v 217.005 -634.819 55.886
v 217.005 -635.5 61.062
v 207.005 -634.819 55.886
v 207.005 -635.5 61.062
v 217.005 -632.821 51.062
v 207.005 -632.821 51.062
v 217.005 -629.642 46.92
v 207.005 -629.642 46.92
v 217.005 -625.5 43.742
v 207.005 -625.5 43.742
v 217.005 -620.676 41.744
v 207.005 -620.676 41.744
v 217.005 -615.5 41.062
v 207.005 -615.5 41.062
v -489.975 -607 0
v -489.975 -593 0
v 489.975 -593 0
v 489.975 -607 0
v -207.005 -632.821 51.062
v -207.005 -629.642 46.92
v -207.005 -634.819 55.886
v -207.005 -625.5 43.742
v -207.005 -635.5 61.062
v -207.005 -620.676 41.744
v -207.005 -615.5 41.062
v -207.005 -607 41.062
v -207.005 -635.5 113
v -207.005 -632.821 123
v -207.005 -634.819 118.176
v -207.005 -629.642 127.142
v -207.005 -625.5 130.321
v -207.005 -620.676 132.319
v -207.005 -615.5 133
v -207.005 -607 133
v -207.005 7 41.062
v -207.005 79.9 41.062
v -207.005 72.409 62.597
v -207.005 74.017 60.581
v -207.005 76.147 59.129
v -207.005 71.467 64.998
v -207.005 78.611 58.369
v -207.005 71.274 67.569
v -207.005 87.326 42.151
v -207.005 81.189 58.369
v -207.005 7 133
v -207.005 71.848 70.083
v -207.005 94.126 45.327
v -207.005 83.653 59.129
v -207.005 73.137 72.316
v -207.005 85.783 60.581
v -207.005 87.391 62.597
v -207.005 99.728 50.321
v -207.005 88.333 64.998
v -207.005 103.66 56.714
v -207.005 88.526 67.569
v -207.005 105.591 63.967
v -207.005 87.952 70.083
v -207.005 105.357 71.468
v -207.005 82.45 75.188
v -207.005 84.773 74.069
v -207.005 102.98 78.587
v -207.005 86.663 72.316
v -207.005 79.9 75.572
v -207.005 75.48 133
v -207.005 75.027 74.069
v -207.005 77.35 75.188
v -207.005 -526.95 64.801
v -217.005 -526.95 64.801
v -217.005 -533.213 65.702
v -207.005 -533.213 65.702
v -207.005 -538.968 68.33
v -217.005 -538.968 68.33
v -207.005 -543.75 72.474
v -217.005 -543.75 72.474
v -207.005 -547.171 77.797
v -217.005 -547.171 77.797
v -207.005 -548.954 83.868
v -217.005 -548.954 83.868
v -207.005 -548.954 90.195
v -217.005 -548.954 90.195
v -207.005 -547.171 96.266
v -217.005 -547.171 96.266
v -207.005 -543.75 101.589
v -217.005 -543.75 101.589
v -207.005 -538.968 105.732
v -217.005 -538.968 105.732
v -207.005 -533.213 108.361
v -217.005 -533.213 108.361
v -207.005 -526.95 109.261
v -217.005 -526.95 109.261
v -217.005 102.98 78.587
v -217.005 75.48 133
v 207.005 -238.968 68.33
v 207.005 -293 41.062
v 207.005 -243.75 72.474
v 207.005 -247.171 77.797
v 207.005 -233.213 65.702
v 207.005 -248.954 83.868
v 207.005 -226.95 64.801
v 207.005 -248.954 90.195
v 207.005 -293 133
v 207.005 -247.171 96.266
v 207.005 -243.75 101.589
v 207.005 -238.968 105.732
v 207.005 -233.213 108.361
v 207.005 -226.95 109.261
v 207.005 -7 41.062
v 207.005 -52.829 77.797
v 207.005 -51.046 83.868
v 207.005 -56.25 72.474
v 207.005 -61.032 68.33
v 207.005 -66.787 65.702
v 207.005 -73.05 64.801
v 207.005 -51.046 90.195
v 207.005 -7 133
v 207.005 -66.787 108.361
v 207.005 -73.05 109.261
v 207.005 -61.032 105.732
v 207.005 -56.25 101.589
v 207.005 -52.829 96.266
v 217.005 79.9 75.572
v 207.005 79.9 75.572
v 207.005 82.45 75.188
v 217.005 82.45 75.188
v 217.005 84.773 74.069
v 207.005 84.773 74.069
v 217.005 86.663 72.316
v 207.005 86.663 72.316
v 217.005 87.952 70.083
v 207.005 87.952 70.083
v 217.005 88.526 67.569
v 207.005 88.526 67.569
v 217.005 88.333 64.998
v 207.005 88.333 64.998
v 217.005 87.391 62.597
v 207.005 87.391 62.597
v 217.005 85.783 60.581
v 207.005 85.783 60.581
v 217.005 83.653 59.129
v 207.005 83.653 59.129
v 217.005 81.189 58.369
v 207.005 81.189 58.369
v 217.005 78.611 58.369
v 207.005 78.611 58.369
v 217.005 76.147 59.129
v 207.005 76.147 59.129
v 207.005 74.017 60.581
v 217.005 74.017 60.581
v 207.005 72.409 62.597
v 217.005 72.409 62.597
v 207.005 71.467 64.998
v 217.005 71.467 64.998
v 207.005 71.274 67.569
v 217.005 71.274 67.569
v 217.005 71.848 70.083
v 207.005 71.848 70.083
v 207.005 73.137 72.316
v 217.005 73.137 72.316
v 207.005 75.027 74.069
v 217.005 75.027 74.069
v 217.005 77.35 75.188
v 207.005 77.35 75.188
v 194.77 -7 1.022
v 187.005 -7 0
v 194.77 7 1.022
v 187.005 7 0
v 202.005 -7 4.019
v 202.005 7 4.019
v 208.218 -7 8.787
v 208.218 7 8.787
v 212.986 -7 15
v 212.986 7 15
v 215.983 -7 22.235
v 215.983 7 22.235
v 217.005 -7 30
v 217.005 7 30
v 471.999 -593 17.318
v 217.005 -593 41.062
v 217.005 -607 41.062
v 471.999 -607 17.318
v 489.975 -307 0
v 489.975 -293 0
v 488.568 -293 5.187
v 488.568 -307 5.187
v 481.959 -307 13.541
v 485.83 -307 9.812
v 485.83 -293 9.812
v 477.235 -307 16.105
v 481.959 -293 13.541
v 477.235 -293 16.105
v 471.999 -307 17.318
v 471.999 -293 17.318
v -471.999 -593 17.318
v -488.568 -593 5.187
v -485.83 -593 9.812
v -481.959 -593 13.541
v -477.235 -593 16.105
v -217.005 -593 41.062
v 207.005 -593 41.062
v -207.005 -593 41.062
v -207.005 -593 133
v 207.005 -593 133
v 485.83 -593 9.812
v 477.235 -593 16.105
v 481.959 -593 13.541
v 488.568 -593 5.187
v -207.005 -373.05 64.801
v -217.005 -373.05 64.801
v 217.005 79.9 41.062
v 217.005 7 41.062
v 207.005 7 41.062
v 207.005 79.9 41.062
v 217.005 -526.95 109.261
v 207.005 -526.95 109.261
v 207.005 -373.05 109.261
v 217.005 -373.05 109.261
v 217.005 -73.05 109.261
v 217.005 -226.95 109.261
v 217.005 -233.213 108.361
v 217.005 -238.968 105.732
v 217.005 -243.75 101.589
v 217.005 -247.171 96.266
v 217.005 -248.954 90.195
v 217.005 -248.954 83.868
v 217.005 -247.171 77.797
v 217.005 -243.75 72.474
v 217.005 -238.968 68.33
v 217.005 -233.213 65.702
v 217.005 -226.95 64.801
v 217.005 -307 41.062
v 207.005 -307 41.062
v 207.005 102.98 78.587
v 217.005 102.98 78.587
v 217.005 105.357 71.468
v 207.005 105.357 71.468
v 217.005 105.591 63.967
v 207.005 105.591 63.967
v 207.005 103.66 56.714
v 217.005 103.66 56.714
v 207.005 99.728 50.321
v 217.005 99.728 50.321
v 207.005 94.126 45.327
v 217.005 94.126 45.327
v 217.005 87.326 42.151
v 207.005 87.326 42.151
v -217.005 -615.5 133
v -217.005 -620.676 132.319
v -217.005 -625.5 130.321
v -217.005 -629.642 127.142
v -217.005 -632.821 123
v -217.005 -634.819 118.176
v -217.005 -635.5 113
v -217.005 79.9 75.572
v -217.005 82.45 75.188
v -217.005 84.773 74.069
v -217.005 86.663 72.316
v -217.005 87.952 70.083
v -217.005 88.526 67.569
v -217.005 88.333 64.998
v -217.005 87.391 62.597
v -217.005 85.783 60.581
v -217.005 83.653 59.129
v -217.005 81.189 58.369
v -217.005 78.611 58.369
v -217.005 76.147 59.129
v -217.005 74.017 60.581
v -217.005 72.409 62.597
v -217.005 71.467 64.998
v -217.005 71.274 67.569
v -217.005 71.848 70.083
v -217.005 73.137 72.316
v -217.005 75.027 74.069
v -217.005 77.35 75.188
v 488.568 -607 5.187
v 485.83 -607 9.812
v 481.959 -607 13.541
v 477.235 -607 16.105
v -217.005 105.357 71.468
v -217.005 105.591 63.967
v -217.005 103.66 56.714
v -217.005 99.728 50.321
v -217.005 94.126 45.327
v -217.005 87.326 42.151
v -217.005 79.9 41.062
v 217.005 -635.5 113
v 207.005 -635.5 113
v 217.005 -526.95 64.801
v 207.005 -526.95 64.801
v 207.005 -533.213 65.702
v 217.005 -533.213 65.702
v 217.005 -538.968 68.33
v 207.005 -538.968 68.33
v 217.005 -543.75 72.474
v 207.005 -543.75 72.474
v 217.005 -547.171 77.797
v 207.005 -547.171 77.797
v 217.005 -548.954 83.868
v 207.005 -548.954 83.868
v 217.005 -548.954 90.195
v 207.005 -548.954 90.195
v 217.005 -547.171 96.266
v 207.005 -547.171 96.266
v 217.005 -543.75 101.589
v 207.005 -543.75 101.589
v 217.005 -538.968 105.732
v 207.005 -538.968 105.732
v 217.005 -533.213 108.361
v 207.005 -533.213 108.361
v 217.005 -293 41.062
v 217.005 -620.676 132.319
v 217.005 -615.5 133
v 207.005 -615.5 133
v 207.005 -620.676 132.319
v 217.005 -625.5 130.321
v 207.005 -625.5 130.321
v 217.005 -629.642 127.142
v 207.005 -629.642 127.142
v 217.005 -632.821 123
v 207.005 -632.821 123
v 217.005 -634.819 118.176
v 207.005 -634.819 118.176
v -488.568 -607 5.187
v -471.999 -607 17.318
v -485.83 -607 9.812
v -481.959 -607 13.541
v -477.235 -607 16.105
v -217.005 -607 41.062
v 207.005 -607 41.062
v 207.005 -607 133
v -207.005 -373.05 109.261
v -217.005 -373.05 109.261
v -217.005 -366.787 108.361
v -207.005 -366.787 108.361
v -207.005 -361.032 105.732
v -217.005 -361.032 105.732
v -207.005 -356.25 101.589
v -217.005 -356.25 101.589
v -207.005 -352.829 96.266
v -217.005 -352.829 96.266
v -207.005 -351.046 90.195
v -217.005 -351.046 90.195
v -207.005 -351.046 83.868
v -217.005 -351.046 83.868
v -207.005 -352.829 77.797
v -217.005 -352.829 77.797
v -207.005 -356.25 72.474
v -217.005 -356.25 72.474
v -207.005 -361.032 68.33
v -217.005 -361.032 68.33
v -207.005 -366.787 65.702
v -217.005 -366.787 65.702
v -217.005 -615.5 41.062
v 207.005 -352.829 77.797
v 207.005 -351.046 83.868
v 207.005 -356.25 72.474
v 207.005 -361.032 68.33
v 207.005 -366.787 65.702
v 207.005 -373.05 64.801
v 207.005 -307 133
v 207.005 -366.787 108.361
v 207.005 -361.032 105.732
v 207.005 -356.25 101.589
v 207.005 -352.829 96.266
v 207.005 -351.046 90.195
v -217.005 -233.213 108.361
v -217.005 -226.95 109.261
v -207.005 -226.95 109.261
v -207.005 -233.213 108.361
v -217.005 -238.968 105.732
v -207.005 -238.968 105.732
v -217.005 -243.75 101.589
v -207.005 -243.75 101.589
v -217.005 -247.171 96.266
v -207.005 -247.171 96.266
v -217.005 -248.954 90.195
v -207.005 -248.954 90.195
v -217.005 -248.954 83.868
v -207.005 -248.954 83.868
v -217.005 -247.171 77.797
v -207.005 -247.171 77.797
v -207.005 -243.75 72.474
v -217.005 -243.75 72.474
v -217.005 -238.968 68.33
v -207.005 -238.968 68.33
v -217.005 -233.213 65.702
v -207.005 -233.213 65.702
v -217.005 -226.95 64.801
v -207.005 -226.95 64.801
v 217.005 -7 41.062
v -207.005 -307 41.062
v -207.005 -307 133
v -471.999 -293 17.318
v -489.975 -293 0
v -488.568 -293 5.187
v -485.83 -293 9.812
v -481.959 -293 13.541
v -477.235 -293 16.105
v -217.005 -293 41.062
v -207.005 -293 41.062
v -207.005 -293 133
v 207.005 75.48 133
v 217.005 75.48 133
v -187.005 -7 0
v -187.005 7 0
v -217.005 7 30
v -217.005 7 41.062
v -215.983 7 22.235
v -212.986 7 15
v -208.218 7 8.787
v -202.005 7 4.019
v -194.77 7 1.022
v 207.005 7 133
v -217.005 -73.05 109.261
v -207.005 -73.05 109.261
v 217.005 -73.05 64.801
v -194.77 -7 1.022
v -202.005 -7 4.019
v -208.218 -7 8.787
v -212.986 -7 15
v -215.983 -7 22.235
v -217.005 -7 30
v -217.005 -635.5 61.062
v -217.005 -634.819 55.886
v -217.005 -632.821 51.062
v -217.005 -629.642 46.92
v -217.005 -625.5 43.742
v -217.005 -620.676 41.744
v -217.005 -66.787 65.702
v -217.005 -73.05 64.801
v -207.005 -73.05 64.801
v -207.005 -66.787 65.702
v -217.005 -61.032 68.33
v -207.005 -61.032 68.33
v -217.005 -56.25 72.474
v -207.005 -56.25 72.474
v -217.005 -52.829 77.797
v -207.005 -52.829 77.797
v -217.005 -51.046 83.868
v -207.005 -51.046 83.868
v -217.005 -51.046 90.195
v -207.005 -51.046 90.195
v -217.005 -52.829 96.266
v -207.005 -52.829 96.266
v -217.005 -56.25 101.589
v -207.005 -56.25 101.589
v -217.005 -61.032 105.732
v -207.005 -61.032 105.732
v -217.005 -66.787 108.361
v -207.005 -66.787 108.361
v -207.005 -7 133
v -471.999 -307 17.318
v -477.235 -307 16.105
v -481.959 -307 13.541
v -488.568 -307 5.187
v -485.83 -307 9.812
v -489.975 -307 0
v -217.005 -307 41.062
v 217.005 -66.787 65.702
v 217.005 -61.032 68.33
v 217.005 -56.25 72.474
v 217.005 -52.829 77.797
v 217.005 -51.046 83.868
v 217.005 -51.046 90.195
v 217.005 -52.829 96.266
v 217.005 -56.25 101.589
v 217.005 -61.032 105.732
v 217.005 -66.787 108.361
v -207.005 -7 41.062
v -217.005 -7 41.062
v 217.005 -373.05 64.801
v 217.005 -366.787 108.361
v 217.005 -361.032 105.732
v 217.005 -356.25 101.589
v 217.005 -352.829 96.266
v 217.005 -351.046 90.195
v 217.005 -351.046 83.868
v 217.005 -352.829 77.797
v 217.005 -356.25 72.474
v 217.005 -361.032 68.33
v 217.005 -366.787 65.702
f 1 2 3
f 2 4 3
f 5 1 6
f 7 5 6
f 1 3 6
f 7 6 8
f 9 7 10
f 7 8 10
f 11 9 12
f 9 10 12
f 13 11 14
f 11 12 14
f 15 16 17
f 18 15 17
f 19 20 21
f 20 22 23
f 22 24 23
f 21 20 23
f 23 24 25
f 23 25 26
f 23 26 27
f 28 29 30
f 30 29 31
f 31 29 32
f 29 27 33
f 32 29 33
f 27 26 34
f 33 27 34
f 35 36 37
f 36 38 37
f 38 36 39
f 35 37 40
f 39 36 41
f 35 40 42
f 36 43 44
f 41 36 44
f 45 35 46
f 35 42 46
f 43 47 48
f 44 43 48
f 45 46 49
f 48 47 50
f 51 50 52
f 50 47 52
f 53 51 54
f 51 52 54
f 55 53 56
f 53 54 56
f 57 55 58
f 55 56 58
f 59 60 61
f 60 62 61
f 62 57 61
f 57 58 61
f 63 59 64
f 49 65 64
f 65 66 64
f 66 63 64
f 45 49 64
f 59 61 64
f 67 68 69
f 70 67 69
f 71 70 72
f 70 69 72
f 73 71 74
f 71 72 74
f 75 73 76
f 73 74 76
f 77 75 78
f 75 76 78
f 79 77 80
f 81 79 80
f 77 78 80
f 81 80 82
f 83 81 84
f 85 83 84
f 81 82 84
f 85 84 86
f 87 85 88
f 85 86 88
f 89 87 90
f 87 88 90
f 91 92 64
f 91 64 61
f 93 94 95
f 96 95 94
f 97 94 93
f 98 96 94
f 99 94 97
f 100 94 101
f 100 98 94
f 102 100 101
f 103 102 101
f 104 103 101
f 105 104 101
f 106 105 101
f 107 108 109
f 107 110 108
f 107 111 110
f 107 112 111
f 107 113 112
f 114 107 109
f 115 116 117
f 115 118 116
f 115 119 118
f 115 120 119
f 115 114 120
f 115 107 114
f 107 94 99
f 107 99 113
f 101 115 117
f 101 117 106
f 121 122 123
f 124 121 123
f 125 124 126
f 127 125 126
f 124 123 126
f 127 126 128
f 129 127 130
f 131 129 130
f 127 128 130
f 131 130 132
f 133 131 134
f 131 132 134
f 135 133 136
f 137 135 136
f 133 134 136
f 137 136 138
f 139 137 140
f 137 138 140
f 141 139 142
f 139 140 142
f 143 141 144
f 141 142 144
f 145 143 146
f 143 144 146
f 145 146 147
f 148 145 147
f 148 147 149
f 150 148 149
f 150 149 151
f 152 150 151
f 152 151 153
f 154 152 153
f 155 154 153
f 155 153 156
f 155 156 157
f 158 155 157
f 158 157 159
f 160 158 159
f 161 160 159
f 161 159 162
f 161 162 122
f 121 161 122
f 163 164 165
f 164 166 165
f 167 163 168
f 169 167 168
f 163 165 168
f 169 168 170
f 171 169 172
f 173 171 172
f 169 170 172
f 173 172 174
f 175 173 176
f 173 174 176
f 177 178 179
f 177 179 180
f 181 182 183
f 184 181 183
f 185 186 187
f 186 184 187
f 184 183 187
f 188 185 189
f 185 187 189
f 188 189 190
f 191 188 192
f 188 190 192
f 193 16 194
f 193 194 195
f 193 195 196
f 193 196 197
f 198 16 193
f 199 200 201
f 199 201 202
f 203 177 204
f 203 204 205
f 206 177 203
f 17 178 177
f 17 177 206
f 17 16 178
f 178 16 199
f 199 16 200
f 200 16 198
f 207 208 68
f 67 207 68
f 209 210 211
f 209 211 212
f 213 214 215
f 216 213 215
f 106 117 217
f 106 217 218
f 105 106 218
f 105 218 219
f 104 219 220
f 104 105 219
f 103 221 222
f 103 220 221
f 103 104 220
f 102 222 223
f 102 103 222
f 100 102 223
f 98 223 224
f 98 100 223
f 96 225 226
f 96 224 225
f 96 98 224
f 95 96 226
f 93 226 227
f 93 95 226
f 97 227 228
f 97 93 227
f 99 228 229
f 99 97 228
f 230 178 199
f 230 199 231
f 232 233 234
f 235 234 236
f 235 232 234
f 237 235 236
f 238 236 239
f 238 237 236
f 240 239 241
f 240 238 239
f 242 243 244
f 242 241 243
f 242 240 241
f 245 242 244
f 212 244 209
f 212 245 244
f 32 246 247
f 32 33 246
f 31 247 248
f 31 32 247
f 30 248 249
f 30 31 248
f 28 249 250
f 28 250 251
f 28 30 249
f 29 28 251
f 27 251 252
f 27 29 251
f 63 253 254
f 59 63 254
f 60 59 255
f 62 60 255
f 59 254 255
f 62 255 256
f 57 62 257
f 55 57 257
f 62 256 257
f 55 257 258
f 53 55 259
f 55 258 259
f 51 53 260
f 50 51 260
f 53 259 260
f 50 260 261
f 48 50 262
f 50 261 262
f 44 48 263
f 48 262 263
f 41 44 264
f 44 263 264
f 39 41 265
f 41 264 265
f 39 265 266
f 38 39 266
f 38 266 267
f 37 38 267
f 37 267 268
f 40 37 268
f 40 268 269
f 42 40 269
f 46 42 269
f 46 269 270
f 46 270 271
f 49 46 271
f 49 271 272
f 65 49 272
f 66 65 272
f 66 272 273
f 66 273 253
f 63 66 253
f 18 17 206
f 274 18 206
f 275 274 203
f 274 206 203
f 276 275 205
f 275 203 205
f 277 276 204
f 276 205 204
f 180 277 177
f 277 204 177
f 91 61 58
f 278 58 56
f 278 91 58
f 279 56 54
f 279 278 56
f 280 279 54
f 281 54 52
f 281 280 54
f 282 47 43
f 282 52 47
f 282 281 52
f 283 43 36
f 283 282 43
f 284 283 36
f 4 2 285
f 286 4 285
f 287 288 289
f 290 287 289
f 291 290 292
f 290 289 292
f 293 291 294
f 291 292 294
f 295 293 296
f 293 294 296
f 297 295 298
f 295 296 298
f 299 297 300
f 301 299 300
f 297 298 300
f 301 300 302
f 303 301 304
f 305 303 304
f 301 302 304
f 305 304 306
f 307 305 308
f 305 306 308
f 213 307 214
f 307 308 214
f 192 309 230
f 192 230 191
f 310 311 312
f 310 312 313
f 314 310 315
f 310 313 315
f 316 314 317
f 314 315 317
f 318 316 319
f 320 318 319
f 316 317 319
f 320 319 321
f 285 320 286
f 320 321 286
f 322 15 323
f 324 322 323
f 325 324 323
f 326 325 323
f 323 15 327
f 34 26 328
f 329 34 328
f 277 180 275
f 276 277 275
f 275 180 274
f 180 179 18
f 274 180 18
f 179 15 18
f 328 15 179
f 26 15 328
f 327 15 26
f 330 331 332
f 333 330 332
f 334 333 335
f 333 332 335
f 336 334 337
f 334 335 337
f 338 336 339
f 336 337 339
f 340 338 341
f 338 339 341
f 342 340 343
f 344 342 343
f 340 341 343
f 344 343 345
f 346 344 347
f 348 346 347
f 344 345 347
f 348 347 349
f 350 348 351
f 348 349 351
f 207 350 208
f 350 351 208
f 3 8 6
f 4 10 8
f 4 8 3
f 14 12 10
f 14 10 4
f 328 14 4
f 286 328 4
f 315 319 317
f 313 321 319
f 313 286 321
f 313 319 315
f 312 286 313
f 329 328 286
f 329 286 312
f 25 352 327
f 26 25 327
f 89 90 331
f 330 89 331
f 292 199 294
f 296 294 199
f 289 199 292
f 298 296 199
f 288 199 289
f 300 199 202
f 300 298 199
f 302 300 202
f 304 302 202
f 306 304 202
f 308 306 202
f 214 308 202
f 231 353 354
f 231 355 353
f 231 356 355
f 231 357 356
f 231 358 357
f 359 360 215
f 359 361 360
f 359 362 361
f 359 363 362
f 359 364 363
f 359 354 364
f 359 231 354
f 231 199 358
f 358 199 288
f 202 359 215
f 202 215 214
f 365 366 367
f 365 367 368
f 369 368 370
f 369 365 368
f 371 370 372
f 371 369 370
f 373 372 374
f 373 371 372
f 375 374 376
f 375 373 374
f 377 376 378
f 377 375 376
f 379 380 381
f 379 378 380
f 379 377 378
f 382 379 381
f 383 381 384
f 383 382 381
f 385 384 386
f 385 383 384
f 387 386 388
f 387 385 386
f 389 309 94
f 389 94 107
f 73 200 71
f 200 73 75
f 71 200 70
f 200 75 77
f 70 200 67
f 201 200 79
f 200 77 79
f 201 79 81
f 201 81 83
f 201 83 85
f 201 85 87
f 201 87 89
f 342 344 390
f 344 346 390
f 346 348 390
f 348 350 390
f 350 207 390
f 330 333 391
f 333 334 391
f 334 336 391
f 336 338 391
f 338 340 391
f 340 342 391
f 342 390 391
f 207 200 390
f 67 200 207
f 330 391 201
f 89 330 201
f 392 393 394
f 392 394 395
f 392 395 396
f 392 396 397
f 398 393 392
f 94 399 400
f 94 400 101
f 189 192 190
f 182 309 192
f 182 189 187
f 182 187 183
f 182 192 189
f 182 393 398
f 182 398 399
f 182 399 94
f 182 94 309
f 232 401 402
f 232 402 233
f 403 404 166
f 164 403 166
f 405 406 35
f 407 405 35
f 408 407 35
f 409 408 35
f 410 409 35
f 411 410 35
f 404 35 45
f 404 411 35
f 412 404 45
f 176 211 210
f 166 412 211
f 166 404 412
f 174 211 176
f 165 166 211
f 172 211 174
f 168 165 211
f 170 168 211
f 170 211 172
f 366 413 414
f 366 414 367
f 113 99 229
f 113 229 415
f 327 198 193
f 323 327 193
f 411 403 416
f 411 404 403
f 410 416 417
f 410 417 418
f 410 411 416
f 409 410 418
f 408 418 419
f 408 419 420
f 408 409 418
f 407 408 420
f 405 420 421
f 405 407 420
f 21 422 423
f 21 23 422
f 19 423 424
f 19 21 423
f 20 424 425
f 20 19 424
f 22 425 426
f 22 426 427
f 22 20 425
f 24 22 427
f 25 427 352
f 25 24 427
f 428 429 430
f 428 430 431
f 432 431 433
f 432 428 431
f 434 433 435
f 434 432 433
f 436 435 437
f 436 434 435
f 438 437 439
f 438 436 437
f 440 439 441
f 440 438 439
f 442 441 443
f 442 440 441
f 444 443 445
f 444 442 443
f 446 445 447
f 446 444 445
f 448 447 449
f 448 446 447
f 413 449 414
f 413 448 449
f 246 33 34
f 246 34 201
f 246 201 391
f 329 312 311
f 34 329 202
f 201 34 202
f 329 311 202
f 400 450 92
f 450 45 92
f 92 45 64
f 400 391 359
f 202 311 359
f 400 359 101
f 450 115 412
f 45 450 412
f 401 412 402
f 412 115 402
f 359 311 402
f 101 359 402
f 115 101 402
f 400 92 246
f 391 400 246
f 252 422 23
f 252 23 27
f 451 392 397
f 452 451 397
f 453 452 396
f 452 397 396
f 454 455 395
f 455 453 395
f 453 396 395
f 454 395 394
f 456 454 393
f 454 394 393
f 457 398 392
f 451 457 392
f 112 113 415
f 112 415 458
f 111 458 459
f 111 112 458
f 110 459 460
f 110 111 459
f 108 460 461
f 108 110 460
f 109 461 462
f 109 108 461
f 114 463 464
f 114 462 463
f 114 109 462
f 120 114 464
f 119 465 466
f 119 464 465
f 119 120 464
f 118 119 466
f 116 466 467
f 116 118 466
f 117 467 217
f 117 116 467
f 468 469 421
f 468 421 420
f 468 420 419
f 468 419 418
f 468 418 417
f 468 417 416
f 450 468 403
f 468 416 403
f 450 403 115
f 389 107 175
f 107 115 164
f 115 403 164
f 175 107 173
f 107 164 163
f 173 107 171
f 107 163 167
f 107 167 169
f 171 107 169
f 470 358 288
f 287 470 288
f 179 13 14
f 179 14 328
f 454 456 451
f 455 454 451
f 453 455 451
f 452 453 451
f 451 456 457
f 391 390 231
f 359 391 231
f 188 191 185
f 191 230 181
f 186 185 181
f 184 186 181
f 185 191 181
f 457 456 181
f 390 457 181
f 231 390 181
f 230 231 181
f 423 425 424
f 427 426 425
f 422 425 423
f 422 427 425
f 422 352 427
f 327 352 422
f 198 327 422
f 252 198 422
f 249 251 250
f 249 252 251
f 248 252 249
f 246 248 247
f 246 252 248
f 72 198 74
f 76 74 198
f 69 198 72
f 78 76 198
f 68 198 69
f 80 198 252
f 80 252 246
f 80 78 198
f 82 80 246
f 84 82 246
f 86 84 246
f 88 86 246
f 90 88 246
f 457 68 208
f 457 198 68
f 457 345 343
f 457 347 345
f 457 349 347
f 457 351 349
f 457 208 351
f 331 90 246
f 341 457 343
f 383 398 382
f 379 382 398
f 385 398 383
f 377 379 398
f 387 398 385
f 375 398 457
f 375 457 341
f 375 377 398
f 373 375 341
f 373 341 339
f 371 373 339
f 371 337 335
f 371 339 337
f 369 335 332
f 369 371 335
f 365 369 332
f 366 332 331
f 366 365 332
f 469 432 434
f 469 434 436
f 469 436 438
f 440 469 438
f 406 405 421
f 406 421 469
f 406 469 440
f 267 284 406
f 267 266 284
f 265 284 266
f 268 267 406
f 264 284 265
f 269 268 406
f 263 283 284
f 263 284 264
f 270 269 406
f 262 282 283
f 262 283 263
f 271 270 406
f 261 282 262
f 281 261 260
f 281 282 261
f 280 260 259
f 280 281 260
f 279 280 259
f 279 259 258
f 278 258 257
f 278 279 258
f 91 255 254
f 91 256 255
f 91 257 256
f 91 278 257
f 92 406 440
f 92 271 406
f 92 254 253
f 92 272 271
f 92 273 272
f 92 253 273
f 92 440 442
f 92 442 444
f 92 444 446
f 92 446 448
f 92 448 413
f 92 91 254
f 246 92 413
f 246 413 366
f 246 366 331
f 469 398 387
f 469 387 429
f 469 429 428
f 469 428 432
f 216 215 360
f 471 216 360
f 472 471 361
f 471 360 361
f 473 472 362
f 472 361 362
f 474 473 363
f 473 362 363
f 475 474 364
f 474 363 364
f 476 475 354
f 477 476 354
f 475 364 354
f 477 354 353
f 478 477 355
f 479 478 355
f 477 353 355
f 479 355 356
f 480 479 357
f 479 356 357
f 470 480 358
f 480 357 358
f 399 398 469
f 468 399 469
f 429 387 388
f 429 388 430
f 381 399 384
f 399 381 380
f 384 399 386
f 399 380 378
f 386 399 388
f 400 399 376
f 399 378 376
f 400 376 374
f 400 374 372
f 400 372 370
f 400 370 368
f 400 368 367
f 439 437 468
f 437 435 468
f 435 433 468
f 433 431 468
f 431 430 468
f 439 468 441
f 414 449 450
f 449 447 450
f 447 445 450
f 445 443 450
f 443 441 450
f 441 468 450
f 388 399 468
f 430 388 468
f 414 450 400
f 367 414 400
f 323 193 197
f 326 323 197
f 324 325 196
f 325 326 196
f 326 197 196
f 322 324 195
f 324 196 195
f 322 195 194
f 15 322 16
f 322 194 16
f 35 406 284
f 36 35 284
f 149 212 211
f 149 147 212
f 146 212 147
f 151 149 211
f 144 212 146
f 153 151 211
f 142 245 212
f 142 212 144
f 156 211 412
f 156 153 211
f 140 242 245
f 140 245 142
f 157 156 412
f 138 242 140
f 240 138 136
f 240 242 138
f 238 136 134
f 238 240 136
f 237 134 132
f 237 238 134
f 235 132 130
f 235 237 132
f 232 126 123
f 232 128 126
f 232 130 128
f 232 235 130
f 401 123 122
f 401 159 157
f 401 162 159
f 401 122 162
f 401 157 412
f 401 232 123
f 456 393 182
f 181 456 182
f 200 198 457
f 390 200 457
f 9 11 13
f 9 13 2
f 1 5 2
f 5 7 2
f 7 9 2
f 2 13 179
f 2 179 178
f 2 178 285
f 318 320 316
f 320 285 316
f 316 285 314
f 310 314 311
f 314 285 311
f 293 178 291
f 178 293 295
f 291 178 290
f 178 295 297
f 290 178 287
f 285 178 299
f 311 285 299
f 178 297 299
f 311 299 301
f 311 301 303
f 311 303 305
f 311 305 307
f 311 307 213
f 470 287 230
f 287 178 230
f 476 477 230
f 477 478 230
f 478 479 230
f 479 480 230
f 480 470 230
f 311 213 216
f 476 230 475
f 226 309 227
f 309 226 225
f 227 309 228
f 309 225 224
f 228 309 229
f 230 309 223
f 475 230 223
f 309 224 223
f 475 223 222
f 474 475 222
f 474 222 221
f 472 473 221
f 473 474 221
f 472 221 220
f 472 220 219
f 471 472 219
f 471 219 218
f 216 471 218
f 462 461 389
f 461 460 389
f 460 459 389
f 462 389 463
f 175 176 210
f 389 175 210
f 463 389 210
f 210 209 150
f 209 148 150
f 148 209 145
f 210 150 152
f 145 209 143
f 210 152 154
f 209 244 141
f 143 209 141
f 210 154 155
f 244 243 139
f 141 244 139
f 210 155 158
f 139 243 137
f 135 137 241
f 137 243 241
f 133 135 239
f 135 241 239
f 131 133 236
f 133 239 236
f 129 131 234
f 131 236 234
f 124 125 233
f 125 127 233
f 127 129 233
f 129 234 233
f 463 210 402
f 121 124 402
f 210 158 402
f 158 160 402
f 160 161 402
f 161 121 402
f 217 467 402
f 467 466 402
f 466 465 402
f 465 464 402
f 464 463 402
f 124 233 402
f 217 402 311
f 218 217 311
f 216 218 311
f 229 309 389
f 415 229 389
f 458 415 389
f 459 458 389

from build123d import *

# Parameters (mm, degrees)
SKETCH1_W           = 1237.47
SKETCH1_H           = 14
BOSS_EXTRUDE1_DEPTH = 133
LPATTERN3_COUNT     = 3
LPATTERN3_PITCH     = 300
CUT_EXTRUDE1_DEPTH  = 882.76981136
SKETCH3_W           = 91.937612072
SKETCH3_H           = 741.26
BOSS_EXTRUDE2_DEPTH = 10
SKETCH4_W           = 304.666106801
SKETCH4_H           = 263.446683033
CUT_EXTRUDE2_DEPTH  = 86
SKETCH5_R           = 8.65
CUT_EXTRUDE3_DEPTH  = 960.88018544
FILLET1_R           = 30
FILLET2_R           = 20
FILLET3_R           = 20
CUT_EXTRUDE4_DEPTH  = 960.88018544


with BuildPart() as part:
    # Sketch1 → Boss-Extrude1 (new body)
    with BuildSketch(Plane.XY):
        Rectangle(SKETCH1_W, SKETCH1_H)
    extrude(amount=BOSS_EXTRUDE1_DEPTH)


with BuildPart() as lpattern3_1:
    # LPattern3: pattern copy
    add(part.part.moved(Location(Vector(0, -1, 0) * (1 * LPATTERN3_PITCH))))


with BuildPart() as lpattern3_2:
    # LPattern3: pattern copy
    add(part.part.moved(Location(Vector(0, -1, 0) * (2 * LPATTERN3_PITCH))))


with BuildPart() as cut_extrude1_tool:
    # Sketch2 → Cut-Extrude1 (new, through all)
    with BuildSketch(Plane(origin=(0, 7, 0), x_dir=(1, 0, 0), z_dir=(0, 1, 0))):
        Polygon((-618.735, 0), (-618.735, -133), (-217.005, -133), (-217.005, -41.062387928), (-488.639842036, -15.767947981), (-489.975, 0), align=None)
        Polygon((217.005, -41.062387928), (488.639842036, -15.767947981), (489.975, 0), (618.735, 0), (618.735, -133), (217.005, -133), align=None)
    extrude(amount=-CUT_EXTRUDE1_DEPTH)


with BuildPart() as part_1:
    add(part.part)

    # Cut-Extrude1: cut by cut_extrude1_tool
    add(cut_extrude1_tool.part, mode=Mode.SUBTRACT)



with BuildPart() as lpattern3_1_1:
    add(lpattern3_1.part)

    # Cut-Extrude1: cut by cut_extrude1_tool
    add(cut_extrude1_tool.part, mode=Mode.SUBTRACT)


with BuildPart() as lpattern3_2_1:
    add(lpattern3_2.part)

    # Cut-Extrude1: cut by cut_extrude1_tool
    add(cut_extrude1_tool.part, mode=Mode.SUBTRACT)


with BuildPart() as part_2:
    add(part_1.part)

    add(lpattern3_1_1.part)  # Boss-Extrude2 merges LPattern3_1

    add(lpattern3_2_1.part)  # Boss-Extrude2 merges LPattern3_2
    # Sketch3 → Boss-Extrude2 (add)
    with BuildSketch(Plane.ZY.offset(217.005)):
        with Locations((87.031193964, -264.87)):
            Rectangle(SKETCH3_W, SKETCH3_H)
    boss_extrude2 = extrude(amount=-BOSS_EXTRUDE2_DEPTH)

    # Mirror1: Boss-Extrude2 across plane
    add(boss_extrude2.mirror(Plane(origin=(0, 0, 0), x_dir=(0, 0, 1), z_dir=(1, 0, 0))))

    # Sketch4 → Cut-Extrude2 (cut)
    with BuildSketch(Plane(origin=(0, 7, 0), x_dir=(1, 0, 0), z_dir=(0, 1, 0))):
        with Locations((-369.338053401, -91.037881314)):
            Rectangle(SKETCH4_W, SKETCH4_H)
        with Locations((369.338053401, -91.037881314)):
            Rectangle(SKETCH4_W, SKETCH4_H)
    extrude(amount=-CUT_EXTRUDE2_DEPTH, mode=Mode.SUBTRACT)

    # Sketch5 → Cut-Extrude3 (cut, through all)
    with BuildSketch(Plane.ZY.offset(217.005)):
        with Locations((66.922387928, 79.9)):
            Circle(SKETCH5_R)
        with BuildLine():
            Line((133, 75.48), (78.58674431, 102.979913133))
            ThreePointArc((78.58674431, 102.979913133), (53.374337442, 101.927027217), (41.062387928, 79.9))
            Line((41.062387928, 79.9), (30.442053439, 79.9))
            Line((30.442053439, 79.9), (30.442053439, 120.292255017))
            Line((30.442053439, 120.292255017), (142.138652578, 120.292255017))
            Line((142.138652578, 120.292255017), (142.138652578, 75.48))
            Line((142.138652578, 75.48), (133, 75.48))
        make_face()
    extrude(amount=-CUT_EXTRUDE3_DEPTH, mode=Mode.SUBTRACT)

    # Fillet1
    fillet1_edges = [part_2.edges().sort_by_distance(p)[0] for p in [
        (-217.005, 0, 0),
        (217.005, 0, 0),
    ]]
    fillet(fillet1_edges, radius=FILLET1_R)

    # Fillet2
    fillet2_edges = [part_2.edges().sort_by_distance(p)[0] for p in [
        (212.005, -635.5, 133),
        (212.005, -635.5, 41.062387928),
        (-212.005, -635.5, 41.062387928),
        (-212.005, -635.5, 133),
    ]]
    fillet(fillet2_edges, radius=FILLET2_R)

    # Fillet3
    # the kernel refuses this fillet: 20 mm, written as the material it takes off along each edge
    with BuildSketch(Plane(origin=(488.639842036, -251.216899092, 15.767947981), x_dir=(-0.995692394104561, 0, 0.0927181553005003), z_dir=(0, -1, 0))) as fillet3_piece_1:
        with BuildLine():
            CenterArc((16.713240363, 20), FILLET3_R, 192.778841583, 77.221158417)
            Line((-2.79138168, 15.576232492), (-3.181474121, 15.487757141))
            ThreePointArc((-3.181474121, 15.487757141), (-1.789418438, 7.717557206), (-0.393727599, -0.07055904))
            Line((-0.393727599, -0.07055904), (0, -0.4))
            Line((0, -0.4), (16.713240363, -0.4))
            Line((16.713240363, -0.4), (16.713240363, 0))
        make_face()
    extrude(amount=97.566201815, mode=Mode.SUBTRACT)
    with BuildSketch(Plane(origin=(488.639842036, -551.216899092, 15.767947981), x_dir=(0.08437350613868201, 0, -0.996434198259908), z_dir=(0, -1, 0))) as fillet3_piece_2:
        with BuildLine():
            CenterArc((16.738204459, -19.979111965), FILLET3_R, 92.618841583, 77.221158417)
            Line((-2.948175473, -16.451159984), (-3.341903071, -16.380600944))
            Line((-3.341903071, -16.380600944), (-0.393727599, 0.07055904))
            Line((-0.393727599, 0.07055904), (0, 0.4))
            ThreePointArc((0, 0.4), (7.912187282, 0.4), (15.806097965, 0.399582239))
            Line((15.806097965, 0.399582239), (15.824374563, 0))
        make_face()
    extrude(amount=97.566201815, mode=Mode.SUBTRACT)
    with BuildSketch(Plane(origin=(-488.639842036, -551.216899092, 15.767947981), x_dir=(0.995692394104561, 0, 0.0927181553005003), z_dir=(0, -1, 0)), Plane(origin=(-488.639842036, -251.216899092, 15.767947981), x_dir=(0.995692394104561, 0, 0.0927181553005003), z_dir=(0, -1, 0))) as fillet3_piece_3:
        with BuildLine():
            CenterArc((16.713240363, -20), FILLET3_R, 90, 77.221158417)
            Line((-2.79138168, -15.576232492), (-3.181474121, -15.487757141))
            ThreePointArc((-3.181474121, -15.487757141), (-1.789418438, -7.717557206), (-0.393727599, 0.07055904))
            Line((-0.393727599, 0.07055904), (0, 0.4))
            Line((0, 0.4), (16.713240363, 0.4))
            Line((16.713240363, 0.4), (16.713240363, 0))
        make_face()
    extrude(amount=97.566201815, mode=Mode.SUBTRACT)

    # Sketch6 → Cut-Extrude4 (cut, through all)
    with BuildSketch(Plane.ZY.offset(217.005)):
        with BuildLine():
            Line((109.261193964, -73.05), (109.261193964, -226.95))
            ThreePointArc((109.261193964, -226.95), (87.031193964, -249.18), (64.801193964, -226.95))
            Line((64.801193964, -226.95), (64.801193964, -73.05))
            ThreePointArc((64.801193964, -73.05), (87.031193964, -50.82), (109.261193964, -73.05))
        make_face()
        with BuildLine():
            Line((109.261193964, -526.95), (109.261193964, -373.05))
            ThreePointArc((109.261193964, -373.05), (87.031193964, -350.82), (64.801193964, -373.05))
            Line((64.801193964, -373.05), (64.801193964, -526.95))
            ThreePointArc((64.801193964, -526.95), (87.031193964, -549.18), (109.261193964, -526.95))
        make_face()
    extrude(amount=-CUT_EXTRUDE4_DEPTH, mode=Mode.SUBTRACT)


solid = part_2.part
